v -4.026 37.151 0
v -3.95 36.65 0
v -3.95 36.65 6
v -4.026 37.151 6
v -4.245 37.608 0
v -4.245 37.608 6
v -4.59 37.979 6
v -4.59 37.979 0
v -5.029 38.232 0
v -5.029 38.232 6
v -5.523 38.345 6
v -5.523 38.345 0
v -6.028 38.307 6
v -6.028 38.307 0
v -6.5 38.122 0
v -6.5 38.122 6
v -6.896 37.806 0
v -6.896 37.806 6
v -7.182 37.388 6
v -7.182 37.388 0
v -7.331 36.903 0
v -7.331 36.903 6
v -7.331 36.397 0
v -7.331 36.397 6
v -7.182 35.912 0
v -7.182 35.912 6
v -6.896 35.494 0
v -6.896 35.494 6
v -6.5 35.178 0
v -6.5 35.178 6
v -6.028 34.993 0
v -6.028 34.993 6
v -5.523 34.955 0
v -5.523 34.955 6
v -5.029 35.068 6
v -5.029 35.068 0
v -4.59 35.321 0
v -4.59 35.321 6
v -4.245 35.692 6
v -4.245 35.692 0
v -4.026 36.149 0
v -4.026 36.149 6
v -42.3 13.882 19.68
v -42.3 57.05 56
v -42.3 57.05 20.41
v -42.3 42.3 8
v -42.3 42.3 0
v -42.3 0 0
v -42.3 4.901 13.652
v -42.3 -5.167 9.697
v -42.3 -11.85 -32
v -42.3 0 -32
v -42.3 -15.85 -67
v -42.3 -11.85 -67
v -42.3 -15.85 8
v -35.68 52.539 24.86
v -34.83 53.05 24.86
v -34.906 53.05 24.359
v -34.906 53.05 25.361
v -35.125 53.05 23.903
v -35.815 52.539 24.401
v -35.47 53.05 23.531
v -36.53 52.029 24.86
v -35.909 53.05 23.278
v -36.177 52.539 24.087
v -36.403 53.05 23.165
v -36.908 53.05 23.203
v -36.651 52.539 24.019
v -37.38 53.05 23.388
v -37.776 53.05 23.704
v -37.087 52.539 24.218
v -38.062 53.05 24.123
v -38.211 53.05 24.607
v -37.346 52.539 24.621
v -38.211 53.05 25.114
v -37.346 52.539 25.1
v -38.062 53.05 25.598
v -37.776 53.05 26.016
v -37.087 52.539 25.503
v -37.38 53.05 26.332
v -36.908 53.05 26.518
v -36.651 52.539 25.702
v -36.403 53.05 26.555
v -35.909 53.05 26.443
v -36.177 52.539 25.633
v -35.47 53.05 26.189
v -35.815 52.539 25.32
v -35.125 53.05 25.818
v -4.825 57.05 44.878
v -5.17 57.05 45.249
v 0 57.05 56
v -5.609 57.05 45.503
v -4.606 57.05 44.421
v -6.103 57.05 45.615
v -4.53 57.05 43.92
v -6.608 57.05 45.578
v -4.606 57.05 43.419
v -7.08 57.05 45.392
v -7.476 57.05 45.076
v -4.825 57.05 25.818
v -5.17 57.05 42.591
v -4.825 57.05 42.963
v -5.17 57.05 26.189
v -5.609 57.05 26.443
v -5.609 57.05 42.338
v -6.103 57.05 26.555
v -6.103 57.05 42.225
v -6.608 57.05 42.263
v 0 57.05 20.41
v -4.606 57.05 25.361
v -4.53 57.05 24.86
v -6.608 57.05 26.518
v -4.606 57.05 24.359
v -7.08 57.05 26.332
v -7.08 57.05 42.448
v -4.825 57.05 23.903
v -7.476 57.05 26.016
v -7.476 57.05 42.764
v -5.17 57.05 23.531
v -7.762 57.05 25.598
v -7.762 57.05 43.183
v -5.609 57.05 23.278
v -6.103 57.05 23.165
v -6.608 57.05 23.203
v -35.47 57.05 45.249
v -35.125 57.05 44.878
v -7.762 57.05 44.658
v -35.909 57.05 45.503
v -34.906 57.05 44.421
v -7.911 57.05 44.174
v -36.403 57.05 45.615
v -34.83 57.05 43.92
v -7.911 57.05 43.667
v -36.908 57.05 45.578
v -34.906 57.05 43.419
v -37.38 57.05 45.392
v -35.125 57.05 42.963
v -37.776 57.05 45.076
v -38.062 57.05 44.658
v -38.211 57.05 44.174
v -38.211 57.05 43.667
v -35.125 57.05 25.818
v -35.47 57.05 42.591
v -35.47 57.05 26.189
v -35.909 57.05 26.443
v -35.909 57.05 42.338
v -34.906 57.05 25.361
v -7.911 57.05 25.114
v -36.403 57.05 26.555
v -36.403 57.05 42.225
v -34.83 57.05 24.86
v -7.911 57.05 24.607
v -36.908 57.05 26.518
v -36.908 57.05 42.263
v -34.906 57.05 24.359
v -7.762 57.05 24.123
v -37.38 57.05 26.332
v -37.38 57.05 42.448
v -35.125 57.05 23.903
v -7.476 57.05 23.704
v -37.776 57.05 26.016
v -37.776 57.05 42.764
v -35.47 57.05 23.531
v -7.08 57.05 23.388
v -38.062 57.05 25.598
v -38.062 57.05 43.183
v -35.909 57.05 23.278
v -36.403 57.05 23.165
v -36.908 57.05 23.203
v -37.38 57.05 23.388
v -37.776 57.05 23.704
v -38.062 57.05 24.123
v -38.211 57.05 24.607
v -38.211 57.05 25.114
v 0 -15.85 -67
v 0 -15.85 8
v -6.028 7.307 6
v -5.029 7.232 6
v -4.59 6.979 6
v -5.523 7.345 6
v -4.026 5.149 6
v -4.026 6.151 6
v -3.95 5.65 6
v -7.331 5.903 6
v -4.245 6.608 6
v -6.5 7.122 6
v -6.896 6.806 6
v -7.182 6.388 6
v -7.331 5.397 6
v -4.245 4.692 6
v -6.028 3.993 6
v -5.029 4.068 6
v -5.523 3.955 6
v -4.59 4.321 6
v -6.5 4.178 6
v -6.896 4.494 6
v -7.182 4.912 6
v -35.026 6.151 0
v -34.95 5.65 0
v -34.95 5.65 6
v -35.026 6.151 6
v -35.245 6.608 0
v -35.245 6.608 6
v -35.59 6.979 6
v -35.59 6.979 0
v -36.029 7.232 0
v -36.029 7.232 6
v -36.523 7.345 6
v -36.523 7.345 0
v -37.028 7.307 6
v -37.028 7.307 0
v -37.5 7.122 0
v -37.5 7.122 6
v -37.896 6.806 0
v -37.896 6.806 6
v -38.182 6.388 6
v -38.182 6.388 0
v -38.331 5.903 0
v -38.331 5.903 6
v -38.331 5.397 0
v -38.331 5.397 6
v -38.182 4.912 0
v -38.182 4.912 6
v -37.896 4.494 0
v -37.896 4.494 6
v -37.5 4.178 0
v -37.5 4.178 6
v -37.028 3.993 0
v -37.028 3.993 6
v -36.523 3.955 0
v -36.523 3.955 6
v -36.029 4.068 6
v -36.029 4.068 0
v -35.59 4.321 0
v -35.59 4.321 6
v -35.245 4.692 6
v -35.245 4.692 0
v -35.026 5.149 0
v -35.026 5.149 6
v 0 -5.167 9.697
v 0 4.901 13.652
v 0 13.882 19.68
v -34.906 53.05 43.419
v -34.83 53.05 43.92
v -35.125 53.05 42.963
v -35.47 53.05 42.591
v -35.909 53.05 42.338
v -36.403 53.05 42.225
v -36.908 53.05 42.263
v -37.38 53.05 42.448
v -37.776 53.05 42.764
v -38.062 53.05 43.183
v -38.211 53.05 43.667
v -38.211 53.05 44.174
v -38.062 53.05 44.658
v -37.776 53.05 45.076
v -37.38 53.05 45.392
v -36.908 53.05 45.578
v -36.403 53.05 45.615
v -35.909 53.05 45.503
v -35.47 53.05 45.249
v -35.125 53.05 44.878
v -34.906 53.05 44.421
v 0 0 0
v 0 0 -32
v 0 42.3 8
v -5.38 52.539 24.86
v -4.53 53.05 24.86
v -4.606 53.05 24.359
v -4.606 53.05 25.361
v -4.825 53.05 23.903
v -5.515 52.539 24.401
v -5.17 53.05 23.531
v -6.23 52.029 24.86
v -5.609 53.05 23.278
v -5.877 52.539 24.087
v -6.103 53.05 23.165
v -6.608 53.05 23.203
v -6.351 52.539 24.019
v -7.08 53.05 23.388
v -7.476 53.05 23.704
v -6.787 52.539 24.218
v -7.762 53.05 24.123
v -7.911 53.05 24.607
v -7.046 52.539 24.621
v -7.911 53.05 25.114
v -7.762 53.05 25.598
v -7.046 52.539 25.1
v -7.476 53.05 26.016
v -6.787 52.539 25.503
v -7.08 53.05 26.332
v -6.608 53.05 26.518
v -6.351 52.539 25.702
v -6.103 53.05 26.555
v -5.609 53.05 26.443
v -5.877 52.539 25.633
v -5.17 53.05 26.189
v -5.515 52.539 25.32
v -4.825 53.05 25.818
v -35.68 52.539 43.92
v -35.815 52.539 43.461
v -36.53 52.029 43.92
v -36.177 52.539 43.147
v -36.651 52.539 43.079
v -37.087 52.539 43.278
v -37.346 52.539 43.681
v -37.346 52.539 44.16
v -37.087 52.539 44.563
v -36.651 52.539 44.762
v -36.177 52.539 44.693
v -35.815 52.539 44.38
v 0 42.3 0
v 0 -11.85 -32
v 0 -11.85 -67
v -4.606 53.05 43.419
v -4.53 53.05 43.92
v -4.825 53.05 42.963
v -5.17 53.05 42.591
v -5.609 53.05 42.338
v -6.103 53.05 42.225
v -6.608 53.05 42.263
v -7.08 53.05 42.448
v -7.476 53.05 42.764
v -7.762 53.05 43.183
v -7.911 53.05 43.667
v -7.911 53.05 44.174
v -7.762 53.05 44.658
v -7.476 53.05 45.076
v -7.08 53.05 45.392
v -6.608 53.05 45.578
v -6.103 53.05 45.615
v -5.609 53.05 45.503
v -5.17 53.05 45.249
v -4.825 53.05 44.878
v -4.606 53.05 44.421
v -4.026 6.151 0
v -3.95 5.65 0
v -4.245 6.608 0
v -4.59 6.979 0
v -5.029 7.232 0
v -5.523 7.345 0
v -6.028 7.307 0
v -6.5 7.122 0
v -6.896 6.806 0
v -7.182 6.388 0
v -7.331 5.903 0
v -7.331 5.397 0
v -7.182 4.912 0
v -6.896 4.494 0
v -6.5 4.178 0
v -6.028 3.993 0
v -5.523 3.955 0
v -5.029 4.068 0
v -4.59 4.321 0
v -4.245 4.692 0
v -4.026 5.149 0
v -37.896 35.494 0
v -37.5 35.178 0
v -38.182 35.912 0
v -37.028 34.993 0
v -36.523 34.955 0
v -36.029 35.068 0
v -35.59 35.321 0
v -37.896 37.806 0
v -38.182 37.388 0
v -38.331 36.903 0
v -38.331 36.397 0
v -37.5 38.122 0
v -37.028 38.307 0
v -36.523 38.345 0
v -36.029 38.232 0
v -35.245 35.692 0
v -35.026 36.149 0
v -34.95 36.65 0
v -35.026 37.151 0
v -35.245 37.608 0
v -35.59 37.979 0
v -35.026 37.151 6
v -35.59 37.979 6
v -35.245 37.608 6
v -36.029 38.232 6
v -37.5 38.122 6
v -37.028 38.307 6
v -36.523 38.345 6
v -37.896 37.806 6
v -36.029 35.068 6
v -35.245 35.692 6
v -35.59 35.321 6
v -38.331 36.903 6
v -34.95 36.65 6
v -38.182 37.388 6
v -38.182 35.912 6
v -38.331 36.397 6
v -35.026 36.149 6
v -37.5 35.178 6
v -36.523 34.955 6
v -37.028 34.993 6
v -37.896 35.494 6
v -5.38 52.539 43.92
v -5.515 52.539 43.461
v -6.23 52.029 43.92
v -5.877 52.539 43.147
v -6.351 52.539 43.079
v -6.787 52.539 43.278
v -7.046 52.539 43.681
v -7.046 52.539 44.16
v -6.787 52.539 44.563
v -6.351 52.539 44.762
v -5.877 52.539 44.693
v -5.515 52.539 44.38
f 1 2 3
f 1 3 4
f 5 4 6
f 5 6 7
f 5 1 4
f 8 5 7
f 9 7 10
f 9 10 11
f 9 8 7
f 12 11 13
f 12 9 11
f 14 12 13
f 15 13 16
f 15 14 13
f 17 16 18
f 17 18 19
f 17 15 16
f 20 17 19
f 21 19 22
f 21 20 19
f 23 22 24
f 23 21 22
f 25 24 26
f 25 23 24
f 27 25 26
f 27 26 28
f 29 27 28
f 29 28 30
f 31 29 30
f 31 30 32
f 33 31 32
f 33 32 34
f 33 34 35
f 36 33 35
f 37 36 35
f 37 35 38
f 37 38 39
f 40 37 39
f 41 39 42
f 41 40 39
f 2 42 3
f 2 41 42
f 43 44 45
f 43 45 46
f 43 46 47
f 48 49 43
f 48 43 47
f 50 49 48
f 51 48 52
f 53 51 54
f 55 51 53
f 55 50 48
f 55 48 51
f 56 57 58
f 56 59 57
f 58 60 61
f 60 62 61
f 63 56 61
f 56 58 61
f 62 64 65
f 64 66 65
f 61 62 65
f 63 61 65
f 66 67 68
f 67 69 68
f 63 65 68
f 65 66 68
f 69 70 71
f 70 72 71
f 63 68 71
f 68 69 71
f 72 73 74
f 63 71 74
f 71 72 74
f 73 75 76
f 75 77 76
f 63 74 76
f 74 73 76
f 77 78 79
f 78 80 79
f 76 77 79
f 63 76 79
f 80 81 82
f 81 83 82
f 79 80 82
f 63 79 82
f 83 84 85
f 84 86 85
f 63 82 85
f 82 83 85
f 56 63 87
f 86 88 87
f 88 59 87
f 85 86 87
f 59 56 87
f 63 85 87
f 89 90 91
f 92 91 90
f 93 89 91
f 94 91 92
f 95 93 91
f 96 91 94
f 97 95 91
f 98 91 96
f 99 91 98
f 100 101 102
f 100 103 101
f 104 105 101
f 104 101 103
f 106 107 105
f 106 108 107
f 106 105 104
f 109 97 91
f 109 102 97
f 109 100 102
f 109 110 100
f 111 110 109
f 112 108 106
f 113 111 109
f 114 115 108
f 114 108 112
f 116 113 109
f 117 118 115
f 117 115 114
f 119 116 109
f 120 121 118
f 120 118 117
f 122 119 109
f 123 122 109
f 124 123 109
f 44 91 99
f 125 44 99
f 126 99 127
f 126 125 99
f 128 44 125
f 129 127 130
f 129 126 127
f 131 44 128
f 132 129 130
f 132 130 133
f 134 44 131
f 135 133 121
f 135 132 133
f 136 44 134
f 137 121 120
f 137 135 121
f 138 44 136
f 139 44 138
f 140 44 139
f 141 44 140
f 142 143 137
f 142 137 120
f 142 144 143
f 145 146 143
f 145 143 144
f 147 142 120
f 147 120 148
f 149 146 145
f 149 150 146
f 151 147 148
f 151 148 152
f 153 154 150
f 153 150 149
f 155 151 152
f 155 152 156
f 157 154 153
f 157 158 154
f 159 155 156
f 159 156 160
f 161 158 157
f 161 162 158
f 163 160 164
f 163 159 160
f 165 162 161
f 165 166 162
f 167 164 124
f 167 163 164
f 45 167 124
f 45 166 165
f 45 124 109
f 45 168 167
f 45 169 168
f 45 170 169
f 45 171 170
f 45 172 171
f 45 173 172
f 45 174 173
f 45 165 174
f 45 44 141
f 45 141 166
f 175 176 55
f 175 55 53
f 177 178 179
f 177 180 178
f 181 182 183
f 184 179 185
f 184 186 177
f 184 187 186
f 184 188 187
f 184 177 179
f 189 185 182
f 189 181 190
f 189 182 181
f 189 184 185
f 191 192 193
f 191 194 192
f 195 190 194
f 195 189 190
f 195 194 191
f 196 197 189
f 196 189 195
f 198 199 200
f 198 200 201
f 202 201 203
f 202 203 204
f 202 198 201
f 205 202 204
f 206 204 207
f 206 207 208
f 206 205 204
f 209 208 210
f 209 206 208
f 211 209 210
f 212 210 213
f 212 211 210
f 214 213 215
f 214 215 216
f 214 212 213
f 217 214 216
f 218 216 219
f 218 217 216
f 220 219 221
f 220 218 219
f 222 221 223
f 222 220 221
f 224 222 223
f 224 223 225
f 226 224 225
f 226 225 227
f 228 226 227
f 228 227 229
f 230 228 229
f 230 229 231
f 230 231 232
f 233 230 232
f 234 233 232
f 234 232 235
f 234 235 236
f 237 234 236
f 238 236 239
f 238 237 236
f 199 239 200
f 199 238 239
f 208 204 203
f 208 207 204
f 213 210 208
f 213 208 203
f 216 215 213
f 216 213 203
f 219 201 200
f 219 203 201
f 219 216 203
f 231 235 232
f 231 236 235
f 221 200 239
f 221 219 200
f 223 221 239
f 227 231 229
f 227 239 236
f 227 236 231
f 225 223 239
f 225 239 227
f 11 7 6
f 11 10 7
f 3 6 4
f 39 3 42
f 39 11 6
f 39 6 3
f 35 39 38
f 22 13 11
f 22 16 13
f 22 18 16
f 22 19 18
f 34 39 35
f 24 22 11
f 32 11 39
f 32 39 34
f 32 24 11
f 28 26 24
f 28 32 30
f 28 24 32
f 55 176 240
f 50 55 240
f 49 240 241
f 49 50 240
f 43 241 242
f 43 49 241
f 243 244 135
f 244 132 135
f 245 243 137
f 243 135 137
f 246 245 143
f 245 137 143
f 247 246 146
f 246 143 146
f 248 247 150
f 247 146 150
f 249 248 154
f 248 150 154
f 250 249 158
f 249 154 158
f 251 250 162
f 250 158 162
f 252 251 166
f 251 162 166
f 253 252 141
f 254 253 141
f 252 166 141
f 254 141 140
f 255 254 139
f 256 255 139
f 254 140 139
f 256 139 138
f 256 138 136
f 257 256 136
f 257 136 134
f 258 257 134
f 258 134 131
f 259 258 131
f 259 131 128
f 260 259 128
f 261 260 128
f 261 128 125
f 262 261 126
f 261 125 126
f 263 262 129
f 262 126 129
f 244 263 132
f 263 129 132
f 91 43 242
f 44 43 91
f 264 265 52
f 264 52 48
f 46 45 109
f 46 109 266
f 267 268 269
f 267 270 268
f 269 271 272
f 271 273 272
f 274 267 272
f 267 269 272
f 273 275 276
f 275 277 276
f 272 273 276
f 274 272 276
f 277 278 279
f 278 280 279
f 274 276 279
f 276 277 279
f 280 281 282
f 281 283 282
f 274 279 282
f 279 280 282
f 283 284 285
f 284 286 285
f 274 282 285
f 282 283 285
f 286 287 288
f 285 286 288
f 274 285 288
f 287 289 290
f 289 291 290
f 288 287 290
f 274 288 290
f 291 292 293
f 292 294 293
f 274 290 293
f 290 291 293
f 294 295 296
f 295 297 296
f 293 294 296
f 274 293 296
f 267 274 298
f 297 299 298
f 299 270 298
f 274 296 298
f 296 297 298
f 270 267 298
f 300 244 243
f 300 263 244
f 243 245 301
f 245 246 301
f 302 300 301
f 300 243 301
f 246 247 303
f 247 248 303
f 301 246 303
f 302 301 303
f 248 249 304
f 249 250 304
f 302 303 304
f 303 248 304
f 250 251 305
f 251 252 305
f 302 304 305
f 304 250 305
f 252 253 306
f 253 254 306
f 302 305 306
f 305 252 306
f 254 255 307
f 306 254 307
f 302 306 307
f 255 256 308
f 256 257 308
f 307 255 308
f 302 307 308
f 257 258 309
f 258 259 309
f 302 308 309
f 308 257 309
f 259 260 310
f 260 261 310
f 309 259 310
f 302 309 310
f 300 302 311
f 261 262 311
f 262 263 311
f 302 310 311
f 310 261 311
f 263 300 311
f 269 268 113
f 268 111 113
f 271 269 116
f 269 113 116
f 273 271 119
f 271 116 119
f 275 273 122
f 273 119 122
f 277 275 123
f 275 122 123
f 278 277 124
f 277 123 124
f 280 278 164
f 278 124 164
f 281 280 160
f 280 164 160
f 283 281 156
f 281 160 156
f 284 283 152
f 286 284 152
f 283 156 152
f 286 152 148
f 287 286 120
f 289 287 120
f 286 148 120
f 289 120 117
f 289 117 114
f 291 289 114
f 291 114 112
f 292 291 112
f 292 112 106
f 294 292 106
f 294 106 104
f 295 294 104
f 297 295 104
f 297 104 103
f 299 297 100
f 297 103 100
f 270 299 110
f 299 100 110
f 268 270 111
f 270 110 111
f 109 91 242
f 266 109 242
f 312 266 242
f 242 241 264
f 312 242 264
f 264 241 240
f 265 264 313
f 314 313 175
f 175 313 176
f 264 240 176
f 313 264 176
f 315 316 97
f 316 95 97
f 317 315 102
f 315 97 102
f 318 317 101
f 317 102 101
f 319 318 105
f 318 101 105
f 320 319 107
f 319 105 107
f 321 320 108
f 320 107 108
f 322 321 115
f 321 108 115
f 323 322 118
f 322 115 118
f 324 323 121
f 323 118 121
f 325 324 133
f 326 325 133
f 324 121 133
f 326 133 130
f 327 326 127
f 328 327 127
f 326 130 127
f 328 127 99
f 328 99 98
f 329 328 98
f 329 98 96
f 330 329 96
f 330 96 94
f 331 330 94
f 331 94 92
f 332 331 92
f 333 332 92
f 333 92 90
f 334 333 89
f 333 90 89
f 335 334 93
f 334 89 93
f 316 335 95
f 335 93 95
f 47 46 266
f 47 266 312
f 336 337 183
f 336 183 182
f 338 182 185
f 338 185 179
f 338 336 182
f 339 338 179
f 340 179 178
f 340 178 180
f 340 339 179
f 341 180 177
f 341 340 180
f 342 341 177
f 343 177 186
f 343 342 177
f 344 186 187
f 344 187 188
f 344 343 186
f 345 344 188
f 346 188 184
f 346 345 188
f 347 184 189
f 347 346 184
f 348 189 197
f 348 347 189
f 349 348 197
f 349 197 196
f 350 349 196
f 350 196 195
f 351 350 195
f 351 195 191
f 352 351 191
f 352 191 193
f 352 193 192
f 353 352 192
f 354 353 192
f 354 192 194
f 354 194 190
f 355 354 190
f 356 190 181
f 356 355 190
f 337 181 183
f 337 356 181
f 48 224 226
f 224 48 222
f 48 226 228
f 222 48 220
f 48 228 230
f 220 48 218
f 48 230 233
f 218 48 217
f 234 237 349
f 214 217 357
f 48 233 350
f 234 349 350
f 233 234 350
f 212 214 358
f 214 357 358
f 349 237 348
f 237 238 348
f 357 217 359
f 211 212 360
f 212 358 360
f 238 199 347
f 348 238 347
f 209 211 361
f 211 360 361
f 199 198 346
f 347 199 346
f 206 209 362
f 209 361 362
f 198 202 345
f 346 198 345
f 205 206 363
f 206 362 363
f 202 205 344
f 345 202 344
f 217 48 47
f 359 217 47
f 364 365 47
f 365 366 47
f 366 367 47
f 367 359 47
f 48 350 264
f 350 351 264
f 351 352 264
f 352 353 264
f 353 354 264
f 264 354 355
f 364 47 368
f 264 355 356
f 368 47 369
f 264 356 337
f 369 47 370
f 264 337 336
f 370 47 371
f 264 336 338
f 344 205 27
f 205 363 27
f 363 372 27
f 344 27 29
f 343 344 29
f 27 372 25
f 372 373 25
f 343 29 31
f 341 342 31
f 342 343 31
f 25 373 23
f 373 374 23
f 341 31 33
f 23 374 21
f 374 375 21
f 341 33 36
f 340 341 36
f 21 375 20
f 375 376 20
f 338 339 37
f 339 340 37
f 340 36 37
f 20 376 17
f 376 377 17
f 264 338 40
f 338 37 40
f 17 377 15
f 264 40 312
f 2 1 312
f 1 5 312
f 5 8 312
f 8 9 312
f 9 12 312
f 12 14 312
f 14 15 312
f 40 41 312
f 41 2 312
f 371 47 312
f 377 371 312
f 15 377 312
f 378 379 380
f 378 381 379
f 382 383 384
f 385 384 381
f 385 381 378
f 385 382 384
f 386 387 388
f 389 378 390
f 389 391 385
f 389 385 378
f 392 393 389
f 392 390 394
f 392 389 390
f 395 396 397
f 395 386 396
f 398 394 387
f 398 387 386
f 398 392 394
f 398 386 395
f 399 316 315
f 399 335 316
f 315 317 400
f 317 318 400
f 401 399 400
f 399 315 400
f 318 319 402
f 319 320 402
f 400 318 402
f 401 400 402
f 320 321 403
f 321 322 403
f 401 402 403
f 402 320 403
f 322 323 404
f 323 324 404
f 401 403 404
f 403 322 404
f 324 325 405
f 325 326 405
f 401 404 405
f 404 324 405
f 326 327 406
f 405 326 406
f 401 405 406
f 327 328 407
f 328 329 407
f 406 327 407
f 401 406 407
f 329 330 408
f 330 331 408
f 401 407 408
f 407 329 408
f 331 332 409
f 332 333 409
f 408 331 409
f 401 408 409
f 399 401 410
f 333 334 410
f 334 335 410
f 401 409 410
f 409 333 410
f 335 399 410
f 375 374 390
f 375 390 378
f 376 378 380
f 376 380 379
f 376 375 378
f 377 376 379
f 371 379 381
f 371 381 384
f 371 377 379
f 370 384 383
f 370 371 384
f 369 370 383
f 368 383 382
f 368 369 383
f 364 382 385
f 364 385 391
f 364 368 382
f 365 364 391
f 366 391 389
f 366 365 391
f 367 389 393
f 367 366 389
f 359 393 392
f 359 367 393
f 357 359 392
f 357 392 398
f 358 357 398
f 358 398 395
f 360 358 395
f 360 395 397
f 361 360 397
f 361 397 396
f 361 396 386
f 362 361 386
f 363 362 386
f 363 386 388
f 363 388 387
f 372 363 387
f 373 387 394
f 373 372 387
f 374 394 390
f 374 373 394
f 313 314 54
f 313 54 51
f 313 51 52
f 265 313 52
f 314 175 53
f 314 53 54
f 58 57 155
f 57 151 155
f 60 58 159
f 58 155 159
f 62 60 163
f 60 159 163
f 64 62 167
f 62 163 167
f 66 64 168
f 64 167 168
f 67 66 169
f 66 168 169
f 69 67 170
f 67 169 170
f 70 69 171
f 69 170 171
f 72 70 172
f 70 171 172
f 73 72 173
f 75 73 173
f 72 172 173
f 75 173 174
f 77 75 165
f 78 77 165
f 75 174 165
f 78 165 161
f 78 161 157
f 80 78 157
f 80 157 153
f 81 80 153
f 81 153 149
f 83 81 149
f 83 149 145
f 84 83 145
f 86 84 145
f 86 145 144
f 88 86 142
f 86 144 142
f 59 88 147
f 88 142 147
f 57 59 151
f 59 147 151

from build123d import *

# Parameters (mm, degrees)
SCHIZZO1_W                   = 42.3
SCHIZZO1_H                   = 42.3
ESTRUSIONE_ESTRUSIONE1_DEPTH = 6
FORO_PER_VITE_M3_1_OUTLINE_R = 1.7
FORO_PER_VITE_M3_1_DEPTH     = 6
ESTRUSIONE_ESTRUSIONE2_DEPTH = 42.3
ESTRUSIONE_ESTRUSIONE4_DEPTH = 42.3
RACCORDO1_R                  = 50


# Read off the part's stored shape, not the designer's step: Foro per Vite M3-1, Foro per Vite M3-2
with BuildPart() as part:
    # Schizzo1 → Estrusione-Estrusione1 (new body)
    with BuildSketch(Plane.XY):
        with Locations((-21.15, 21.15)):
            Rectangle(SCHIZZO1_W, SCHIZZO1_H)
    extrude(amount=ESTRUSIONE_ESTRUSIONE1_DEPTH)

    # Foro per Vite M3-1 outline → Foro per Vite M3-1 (cut)
    with BuildSketch(Plane.XY):
        with Locations((-5.65, 36.65)):
            Circle(FORO_PER_VITE_M3_1_OUTLINE_R)
        with Locations((-36.65, 5.65)):
            Circle(FORO_PER_VITE_M3_1_OUTLINE_R)
        with Locations((-5.65, 5.65)):
            Circle(FORO_PER_VITE_M3_1_OUTLINE_R)
        with Locations((-36.65, 36.65)):
            Circle(FORO_PER_VITE_M3_1_OUTLINE_R)
    extrude(amount=FORO_PER_VITE_M3_1_DEPTH, mode=Mode.SUBTRACT)

    # Schizzo4 → Estrusione-Estrusione2 (add)
    with BuildSketch(Plane.ZY.offset(42.3)):
        Polygon((6, 0), (8, 0), (56, 57.05), (20.410166521, 57.05), (8, 42.3), (6, 42.3), align=None)
    extrude(amount=-ESTRUSIONE_ESTRUSIONE2_DEPTH)

    # Foro per Vite M3-2 outline → Foro per Vite M3-2 (revolve, cut)
    with BuildSketch(Plane(origin=(-6.23, 0, 24.860166521), x_dir=(1, 0, 0), z_dir=(0, 0, 1))):
        Polygon((0, 57.05), (0, 52.028536948), (1.7, 53.05), (1.7, 57.05), align=None)
    revolve(axis=Axis((-6.23, 0, 24.860166521), (0, 1, 0)), mode=Mode.SUBTRACT)

    # Foro per Vite M3-2 2 outline → Foro per Vite M3-2 2 (revolve, cut)
    with BuildSketch(Plane(origin=(-36.53, 0, 43.920166521), x_dir=(1, 0, 0), z_dir=(0, 0, 1))):
        Polygon((0, 57.05), (0, 52.028536948), (1.7, 53.05), (1.7, 57.05), align=None)
    revolve(axis=Axis((-36.53, 0, 43.920166521), (0, 1, 0)), mode=Mode.SUBTRACT)

    # Foro per Vite M3-2 3 outline → Foro per Vite M3-2 3 (revolve, cut)
    with BuildSketch(Plane(origin=(-6.23, 0, 43.920166521), x_dir=(1, 0, 0), z_dir=(0, 0, 1))):
        Polygon((0, 57.05), (0, 52.028536948), (1.7, 53.05), (1.7, 57.05), align=None)
    revolve(axis=Axis((-6.23, 0, 43.920166521), (0, 1, 0)), mode=Mode.SUBTRACT)

    # Foro per Vite M3-2 4 outline → Foro per Vite M3-2 4 (revolve, cut)
    with BuildSketch(Plane(origin=(-36.53, 0, 24.860166521), x_dir=(1, 0, 0), z_dir=(0, 0, 1))):
        Polygon((0, 57.05), (0, 52.028536948), (1.7, 53.05), (1.7, 57.05), align=None)
    revolve(axis=Axis((-36.53, 0, 24.860166521), (0, 1, 0)), mode=Mode.SUBTRACT)

    # Schizzo8 → Estrusione-Estrusione4 (add)
    with BuildSketch(Plane(origin=(0, 0, 0), x_dir=(0, 0, -1), z_dir=(1, 0, 0))):
        Polygon((-8, -15.85), (67, -15.85), (67, -11.85), (32, -11.85), (32, 0), (-8, 0), align=None)
    extrude(amount=-ESTRUSIONE_ESTRUSIONE4_DEPTH)

    # Raccordo1
    # the kernel refuses this fillet: 50 mm, written as the material it adds along each edge
    with BuildSketch(Plane(origin=(-42.3, 0, 8), x_dir=(0, 0.7651893786180985, 0.6438052615892854), z_dir=(1, 0, 0))) as raccordo1_piece_1:
        with BuildLine():
            CenterArc((18.14225095, 50), RACCORDO1_R, 232.741645316, 37.258354684)
            Line((-12.128251651, 10.204313396), (-12.733661703, 9.408399664))
            ThreePointArc((-12.733661703, 9.408399664), (-6.707931087, 4.336967319), (-0.643805262, -0.765189379))
            Line((-0.643805262, -0.765189379), (0, -1))
            Line((0, -1), (18.14225095, -1))
            Line((18.14225095, -1), (18.14225095, 0))
        make_face()
    extrude(amount=42.3)


solid = part.part
